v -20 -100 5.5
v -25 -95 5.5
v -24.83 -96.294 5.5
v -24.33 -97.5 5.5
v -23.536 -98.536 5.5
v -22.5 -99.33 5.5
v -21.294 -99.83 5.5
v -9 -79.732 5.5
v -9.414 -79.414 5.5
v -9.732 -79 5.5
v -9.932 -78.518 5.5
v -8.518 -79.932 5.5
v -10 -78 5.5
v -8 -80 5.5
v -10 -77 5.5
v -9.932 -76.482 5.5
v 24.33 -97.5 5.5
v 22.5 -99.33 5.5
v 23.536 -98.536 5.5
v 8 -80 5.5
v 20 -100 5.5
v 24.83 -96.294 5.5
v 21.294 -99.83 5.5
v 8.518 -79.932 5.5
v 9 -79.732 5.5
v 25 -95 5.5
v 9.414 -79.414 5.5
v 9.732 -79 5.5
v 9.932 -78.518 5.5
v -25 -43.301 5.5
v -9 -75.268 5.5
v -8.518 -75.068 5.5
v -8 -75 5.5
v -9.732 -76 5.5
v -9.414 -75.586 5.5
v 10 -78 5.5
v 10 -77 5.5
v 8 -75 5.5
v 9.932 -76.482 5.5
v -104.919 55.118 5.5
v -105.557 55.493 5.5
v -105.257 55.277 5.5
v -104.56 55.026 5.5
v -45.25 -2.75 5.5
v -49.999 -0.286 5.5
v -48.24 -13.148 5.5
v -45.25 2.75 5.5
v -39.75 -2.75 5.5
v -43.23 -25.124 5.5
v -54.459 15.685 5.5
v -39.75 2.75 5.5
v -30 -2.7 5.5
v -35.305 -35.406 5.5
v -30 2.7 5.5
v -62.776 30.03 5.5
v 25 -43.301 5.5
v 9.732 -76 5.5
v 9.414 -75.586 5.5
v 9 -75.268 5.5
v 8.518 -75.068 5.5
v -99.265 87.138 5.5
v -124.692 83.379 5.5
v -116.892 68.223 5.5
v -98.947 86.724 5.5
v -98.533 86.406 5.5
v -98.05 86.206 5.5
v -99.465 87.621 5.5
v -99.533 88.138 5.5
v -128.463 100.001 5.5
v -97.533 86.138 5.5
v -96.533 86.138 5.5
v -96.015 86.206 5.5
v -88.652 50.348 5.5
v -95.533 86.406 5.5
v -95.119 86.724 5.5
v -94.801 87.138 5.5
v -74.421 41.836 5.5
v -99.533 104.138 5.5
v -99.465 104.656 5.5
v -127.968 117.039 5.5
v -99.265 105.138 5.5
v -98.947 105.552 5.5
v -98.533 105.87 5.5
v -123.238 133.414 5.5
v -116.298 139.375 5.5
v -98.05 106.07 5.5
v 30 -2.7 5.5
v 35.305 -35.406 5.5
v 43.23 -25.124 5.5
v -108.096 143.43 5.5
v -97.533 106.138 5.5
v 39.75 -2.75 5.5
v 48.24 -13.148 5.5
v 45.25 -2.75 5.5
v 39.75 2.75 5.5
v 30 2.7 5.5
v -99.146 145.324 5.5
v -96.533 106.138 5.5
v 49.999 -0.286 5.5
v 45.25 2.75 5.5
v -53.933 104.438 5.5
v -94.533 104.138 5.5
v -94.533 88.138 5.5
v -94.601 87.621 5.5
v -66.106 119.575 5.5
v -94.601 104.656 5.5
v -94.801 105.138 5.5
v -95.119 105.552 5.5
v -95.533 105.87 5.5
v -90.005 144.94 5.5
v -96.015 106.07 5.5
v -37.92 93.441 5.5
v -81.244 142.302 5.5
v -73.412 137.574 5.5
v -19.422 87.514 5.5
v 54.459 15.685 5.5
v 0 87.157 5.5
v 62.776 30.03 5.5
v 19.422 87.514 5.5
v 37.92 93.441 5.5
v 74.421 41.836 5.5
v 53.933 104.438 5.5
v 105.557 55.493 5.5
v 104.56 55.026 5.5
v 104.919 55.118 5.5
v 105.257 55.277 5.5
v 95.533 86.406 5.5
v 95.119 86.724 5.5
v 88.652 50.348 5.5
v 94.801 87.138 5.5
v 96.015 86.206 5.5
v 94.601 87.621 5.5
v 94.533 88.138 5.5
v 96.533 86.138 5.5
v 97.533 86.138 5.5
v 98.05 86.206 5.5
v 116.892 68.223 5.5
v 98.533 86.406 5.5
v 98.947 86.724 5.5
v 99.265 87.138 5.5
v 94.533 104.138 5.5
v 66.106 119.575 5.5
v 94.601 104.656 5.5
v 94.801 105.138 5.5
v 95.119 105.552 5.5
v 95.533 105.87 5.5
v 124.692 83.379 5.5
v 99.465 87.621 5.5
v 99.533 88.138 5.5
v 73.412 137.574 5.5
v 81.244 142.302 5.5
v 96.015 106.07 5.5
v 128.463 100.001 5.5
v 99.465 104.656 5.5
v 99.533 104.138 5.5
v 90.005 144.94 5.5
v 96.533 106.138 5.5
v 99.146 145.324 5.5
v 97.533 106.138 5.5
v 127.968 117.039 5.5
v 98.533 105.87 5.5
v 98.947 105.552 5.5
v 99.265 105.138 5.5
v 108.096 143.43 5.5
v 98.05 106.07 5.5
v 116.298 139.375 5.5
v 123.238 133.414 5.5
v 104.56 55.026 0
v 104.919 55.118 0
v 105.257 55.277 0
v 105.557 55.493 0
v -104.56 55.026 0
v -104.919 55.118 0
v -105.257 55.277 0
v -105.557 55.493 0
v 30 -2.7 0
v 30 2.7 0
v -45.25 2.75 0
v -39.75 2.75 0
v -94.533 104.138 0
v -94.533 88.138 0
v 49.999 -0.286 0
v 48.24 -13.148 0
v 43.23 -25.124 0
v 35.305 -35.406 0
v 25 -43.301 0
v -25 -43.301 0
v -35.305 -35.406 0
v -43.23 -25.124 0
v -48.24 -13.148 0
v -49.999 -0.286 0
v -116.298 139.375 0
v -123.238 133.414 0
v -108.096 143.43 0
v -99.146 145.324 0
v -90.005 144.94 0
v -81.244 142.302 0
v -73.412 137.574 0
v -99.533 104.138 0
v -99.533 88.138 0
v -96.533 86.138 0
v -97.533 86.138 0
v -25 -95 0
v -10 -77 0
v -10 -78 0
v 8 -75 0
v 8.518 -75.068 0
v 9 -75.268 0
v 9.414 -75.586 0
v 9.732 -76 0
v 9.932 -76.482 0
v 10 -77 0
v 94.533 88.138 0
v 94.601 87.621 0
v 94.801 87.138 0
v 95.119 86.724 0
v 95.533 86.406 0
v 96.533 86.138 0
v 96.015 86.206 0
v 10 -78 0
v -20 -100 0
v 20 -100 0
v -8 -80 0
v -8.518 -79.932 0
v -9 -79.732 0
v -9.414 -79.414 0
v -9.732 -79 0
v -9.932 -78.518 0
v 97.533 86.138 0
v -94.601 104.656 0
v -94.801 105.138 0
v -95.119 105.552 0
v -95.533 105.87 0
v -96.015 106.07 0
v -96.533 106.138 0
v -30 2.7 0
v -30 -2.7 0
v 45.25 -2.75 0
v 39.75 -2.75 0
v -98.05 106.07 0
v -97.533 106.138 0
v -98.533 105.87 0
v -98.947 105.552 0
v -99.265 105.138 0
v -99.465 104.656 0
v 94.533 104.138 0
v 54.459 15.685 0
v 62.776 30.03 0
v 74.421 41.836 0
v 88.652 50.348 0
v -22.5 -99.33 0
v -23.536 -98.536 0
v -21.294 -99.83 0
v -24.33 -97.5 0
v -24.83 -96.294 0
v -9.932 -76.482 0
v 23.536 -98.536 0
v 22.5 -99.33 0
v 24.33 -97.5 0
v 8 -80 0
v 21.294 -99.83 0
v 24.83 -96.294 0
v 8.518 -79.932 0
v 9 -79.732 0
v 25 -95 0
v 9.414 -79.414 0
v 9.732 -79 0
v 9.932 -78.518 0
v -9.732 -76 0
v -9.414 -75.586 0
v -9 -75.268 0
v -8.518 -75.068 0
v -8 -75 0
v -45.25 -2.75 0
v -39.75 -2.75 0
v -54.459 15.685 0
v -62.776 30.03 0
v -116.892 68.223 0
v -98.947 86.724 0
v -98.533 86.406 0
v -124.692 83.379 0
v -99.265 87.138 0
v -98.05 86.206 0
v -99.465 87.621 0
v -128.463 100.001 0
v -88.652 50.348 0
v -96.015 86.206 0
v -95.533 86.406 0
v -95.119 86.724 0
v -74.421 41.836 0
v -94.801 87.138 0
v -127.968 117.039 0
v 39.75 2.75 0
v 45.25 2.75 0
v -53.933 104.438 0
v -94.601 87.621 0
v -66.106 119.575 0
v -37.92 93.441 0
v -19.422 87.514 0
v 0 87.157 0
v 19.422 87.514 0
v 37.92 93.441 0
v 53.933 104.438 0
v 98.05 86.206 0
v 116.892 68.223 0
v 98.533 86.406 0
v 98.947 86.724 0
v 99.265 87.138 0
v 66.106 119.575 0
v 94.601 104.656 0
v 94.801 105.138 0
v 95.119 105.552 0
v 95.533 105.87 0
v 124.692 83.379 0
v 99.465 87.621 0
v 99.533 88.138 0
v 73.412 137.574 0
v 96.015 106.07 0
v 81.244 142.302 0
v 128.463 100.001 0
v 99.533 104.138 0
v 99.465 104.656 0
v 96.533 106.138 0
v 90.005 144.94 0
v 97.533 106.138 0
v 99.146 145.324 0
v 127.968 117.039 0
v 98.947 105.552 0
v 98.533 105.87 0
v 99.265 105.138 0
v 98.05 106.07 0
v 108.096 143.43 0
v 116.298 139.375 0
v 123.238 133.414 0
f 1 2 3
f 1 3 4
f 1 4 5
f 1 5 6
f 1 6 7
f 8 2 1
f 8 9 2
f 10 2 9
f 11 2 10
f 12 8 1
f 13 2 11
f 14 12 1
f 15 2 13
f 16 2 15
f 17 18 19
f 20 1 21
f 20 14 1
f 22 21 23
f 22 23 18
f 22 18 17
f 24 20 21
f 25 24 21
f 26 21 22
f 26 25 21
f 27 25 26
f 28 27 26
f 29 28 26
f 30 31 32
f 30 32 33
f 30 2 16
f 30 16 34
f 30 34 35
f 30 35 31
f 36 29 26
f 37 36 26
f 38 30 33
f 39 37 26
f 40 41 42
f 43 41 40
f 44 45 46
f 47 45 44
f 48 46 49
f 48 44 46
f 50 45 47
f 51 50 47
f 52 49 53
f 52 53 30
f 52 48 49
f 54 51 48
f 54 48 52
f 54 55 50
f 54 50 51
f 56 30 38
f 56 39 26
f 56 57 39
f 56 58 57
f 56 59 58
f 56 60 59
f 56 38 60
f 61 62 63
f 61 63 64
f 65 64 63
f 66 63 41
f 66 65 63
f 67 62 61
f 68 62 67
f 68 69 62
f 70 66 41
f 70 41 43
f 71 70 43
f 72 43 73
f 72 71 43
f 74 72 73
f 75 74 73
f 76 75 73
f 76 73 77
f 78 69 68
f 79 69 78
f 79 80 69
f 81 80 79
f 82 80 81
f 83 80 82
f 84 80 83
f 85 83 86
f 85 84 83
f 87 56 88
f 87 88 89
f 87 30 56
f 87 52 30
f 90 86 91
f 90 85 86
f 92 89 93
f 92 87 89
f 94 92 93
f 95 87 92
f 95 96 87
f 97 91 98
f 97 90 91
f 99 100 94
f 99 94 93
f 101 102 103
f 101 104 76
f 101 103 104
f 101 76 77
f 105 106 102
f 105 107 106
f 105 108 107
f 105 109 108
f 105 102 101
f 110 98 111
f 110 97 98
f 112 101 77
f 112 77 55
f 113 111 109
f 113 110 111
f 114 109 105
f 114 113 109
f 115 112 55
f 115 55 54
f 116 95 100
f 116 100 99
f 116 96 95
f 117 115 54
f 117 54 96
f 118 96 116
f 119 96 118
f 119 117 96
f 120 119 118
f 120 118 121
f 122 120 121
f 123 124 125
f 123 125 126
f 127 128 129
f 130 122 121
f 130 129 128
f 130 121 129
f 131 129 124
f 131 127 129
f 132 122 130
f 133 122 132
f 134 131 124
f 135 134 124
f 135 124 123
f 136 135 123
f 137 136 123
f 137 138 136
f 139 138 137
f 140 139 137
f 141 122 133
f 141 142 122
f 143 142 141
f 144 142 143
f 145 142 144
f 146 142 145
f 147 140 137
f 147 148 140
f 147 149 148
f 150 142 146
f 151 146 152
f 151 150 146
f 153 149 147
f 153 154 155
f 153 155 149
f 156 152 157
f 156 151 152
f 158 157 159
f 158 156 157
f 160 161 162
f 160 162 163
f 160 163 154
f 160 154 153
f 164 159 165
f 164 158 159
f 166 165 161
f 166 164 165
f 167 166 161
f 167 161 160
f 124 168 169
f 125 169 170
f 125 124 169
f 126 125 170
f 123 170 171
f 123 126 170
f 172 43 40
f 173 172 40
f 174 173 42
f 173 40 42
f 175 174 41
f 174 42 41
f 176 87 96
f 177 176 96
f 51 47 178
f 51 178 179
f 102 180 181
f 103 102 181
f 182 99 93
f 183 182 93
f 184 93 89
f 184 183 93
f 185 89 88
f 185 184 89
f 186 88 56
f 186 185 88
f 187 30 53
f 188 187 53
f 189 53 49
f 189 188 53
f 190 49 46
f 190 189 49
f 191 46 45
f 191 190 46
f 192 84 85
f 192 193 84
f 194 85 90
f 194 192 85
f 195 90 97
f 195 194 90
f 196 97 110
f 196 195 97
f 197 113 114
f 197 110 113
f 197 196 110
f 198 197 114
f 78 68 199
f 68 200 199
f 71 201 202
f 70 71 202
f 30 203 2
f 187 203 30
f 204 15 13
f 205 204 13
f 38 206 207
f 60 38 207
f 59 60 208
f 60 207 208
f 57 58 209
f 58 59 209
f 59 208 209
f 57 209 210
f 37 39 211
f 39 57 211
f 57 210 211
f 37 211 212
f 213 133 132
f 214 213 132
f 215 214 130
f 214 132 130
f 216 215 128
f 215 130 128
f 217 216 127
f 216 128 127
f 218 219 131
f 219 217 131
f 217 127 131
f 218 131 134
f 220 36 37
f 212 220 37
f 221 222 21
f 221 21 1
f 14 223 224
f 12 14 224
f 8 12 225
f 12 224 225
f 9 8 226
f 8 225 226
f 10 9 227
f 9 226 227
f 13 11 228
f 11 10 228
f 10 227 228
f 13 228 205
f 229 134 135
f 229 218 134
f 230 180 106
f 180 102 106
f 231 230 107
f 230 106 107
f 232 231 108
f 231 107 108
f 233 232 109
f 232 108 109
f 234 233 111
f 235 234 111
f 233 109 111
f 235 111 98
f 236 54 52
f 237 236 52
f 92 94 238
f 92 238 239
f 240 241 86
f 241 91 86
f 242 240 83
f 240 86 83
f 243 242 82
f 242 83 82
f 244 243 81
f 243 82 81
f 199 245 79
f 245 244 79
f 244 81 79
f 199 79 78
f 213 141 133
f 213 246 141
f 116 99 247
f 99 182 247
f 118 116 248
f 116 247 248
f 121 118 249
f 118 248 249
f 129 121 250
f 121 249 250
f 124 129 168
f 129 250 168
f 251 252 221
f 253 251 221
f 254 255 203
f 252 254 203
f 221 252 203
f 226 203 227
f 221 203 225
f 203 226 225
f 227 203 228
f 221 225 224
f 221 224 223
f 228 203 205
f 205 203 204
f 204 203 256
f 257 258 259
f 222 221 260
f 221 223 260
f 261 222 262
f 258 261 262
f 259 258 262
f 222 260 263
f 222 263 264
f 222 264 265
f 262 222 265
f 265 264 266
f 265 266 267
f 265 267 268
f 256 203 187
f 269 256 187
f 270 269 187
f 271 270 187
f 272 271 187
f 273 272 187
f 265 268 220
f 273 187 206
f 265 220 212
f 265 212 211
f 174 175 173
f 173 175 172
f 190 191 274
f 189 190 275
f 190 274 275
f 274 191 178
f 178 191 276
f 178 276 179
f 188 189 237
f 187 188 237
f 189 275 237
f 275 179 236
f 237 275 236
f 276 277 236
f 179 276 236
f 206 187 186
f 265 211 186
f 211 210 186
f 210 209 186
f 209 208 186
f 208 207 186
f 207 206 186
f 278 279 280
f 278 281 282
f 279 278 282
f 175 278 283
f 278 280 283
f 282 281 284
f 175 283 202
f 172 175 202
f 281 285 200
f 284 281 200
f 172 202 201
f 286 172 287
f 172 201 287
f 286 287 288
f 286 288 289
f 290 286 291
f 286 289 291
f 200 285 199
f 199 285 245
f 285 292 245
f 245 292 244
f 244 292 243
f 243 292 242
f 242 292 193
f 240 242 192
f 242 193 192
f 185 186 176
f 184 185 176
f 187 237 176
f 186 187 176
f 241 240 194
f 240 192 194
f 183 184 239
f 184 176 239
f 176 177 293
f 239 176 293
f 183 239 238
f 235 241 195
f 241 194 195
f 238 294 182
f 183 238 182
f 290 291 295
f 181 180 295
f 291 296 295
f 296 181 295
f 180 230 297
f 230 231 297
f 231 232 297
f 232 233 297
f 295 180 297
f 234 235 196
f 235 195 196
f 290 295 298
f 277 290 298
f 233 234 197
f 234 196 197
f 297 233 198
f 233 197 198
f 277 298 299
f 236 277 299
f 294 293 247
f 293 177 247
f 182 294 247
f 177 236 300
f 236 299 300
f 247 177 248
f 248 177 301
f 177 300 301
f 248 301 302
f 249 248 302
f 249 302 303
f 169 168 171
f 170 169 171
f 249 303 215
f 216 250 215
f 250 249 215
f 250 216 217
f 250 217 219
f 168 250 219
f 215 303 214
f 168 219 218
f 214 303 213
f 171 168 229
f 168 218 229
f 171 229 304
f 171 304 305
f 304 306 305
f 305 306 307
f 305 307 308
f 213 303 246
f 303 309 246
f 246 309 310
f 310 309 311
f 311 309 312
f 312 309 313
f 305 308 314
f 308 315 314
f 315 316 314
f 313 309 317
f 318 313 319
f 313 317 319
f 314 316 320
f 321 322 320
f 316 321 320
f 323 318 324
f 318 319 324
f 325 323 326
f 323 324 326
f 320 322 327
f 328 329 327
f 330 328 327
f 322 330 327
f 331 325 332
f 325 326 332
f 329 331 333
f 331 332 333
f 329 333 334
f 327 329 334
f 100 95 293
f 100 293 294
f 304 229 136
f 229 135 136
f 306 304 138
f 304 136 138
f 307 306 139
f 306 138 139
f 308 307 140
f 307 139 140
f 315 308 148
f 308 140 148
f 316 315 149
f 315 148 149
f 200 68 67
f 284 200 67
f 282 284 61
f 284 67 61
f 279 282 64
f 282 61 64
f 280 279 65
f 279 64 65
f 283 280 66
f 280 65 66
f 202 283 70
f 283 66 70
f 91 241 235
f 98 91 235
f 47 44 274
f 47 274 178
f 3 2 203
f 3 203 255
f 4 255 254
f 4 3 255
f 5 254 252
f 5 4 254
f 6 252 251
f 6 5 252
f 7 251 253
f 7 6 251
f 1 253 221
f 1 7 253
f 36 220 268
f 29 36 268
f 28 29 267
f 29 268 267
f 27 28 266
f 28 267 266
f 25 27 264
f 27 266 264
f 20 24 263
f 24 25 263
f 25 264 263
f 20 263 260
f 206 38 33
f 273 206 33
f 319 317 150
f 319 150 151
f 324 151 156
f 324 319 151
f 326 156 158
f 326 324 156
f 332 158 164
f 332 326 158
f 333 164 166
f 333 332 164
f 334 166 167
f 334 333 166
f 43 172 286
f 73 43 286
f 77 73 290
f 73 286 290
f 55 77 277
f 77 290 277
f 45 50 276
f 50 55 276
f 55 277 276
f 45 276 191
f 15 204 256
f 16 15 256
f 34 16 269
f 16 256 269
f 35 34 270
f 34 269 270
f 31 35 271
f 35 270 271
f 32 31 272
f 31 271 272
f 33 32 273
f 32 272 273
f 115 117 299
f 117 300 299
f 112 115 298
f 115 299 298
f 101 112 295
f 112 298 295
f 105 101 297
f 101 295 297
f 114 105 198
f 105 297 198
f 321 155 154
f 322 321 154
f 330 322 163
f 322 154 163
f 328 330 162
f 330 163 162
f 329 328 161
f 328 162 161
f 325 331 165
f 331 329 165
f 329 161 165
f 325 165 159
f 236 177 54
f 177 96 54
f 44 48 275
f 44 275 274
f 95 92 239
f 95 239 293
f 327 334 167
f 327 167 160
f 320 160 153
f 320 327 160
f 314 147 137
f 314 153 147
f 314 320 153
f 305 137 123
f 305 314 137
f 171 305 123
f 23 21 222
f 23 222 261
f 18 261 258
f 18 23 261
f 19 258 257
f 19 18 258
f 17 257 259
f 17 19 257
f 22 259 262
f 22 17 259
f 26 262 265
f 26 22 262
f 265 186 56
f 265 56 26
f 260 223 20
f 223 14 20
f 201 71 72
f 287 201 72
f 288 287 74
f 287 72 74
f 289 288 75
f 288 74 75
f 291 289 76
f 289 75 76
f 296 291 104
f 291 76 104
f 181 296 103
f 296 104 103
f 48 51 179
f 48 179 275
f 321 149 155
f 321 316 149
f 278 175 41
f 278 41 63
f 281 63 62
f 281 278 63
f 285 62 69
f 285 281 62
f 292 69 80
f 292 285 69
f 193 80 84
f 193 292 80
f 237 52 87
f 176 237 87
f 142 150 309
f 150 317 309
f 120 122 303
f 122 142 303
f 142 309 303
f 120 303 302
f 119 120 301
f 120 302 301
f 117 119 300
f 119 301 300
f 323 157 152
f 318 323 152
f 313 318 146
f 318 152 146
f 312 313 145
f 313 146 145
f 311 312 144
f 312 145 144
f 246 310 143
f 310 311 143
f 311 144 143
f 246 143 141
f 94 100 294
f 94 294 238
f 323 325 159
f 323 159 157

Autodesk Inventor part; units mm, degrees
ref_plane "YZ Plane" through (0, 0, 0) normal (1, 0, 0) x (0, 1, 0)
ref_plane "XZ Plane" through (0, 0, 0) normal (0, 1, 0) x (-1, 0, 0)
ref_plane "XY Plane" through (0, 0, 0) normal (0, 0, 1) x (1, 0, 0)
sketch "Sketch1" plane through (0, 0, 0) normal (0, 0, 1) x (1, 0, 0)
  circle A0 centre (0, 0) radius 50
  arc A1 (-73.4116, 137.5742) -> (0, 87.1574) centre (-8.4976, 153.4397) ccw
  arc A2 (-73.4116, 137.5742) -> (-123.2383, 133.4142) centre (-96.0994, 108.8375) ccw
  arc A3 (-123.2383, 133.4142) -> (-105.1177, 55.113) centre (-61.0095, 106.5679) ccw
  arc A4 (-49.9992, -0.286) -> (-105.1177, 55.113) centre (-114.9857, -9.8243) ccw
  line L0 (-25, 0) -> (25, 0)
  line L1 (25, 0) -> (25, -100)
  line L2 (25, -100) -> (-25, -100)
  line L3 (-25, -100) -> (-25, 0)
  line L4 (0, 63.4714) -> (21.5005, 63.4714) construction
  line L5 (-99.5328, 106.1382) -> (-94.5328, 106.1382)
  line L6 (-94.5328, 106.1382) -> (-94.5328, 86.1382)
  line L7 (-94.5328, 86.1382) -> (-99.5328, 86.1382)
  line L8 (-99.5328, 86.1382) -> (-99.5328, 106.1382)
  arc A5 (0, 87.1574) -> (73.4116, 137.5742) centre (8.4976, 153.4397) ccw
  arc A6 (123.2383, 133.4142) -> (73.4116, 137.5742) centre (96.0994, 108.8375) ccw
  arc A7 (105.1177, 55.113) -> (123.2383, 133.4142) centre (61.0095, 106.5679) ccw
  arc A8 (105.1177, 55.113) -> (49.9992, -0.286) centre (114.9857, -9.8243) ccw
  line L9 (99.5328, 106.1382) -> (94.5328, 106.1382)
  line L10 (94.5328, 106.1382) -> (94.5328, 86.1382)
  line L11 (94.5328, 86.1382) -> (99.5328, 86.1382)
  line L12 (99.5328, 86.1382) -> (99.5328, 106.1382)
  line L13 (49.9992, -0.286) -> (-49.9992, -0.286)
  line L14 (-7.7212, -92.2433) -> (-3.7298, -89.2319)
  line L15 (-3.7298, -89.2319) -> (-15.7757, -73.2664)
  line L16 (-15.7757, -73.2664) -> (-19.7671, -76.2779)
  line L17 (-19.7671, -76.2779) -> (-7.7212, -92.2433)
  line L18 (7.7212, -92.2433) -> (3.7298, -89.2319)
  line L19 (3.7298, -89.2319) -> (15.7757, -73.2664)
  line L20 (15.7757, -73.2664) -> (19.7671, -76.2779)
  line L21 (19.7671, -76.2779) -> (7.7212, -92.2433)
  dimension "d0" = 100
  dimension "d4" = 50
  dimension "d5" = 50
  dimension "d6" = 100
  dimension "d8" = 5
  dimension "d9" = 20
  dimension "d10" = 5
  dimension "d11" = 20
  dimension "d12" = 5
extrude "Extrusion2" add sketch "Sketch1" along normal blind 5.5 contours A0 L13 L1 L0 L3 | A0 A4 A3 A2 A1 A5 A6 A7 A8 | L13 L3 A0 | A0 L1 L13 | L3 L13 L1 A0 | A0 L1 L2 L3 | L3 L0 L1 L13 | L17 L16 L15 L14 | L18 L19 L20 L21
fillet "Fillet4" radius 2 4 edges at (-99.5328, 106.1382, 2.75) (-94.5328, 106.1382, 2.75) (-94.5328, 86.1382, 2.75) (-99.5328, 86.1382, 2.75)
fillet "Fillet5" radius 2 4 edges at (99.5328, 86.1382, 2.75) (99.5328, 106.1382, 2.75) (94.5328, 106.1382, 2.75) (94.5328, 86.1382, 2.75)
sketch "Sketch2" plane through (0, 0, 5.5) normal (0, 0, 1) x (1, 0, 0)
  line L0 (-10, -80) -> (10, -80)
  line L1 (10, -80) -> (10, -75)
  line L2 (10, -75) -> (-10, -75)
  line L3 (-10, -75) -> (-10, -80)
  point P0 (0, 0)
  dimension "d20" = 20
  dimension "d21" = 5
extrude "Extrusion3" cut sketch "Sketch2" against normal blind 5.5
fillet "Fillet6" radius 5 2 edges at (25, -100, 2.75) (-25, -100, 2.75)
fillet "Fillet7" radius 2 4 edges at (-10, -75, 2.75) (-10, -80, 2.75) (10, -80, 2.75) (10, -75, 2.75)
fillet "Fillet8" radius 2 2 edges at (-105.1177, 55.113, 2.75) (105.1177, 55.113, 2.75)
sketch "Sketch4" plane through (0, 0, 5.5) normal (0, 0, 1) x (1, 0, 0)
  line L0 (30, 2.7) -> (-30, 2.7)
  line L1 (-30, 2.7) -> (-30, -2.7)
  line L2 (-30, -2.7) -> (30, -2.7)
  line L3 (30, -2.7) -> (30, 2.7)
  point P0 (0, 0)
  dimension "d34" = 60
  dimension "d35" = 5.4
extrude "Extrusion5" cut sketch "Sketch4" against normal blind 10
sketch "Sketch5" plane through (0, 0, 5.5) normal (0, 0, 1) x (1, 0, 0)
  line L0 (39.75, 2.75) -> (45.25, 2.75)
  line L1 (45.25, 2.75) -> (45.25, -2.75)
  line L2 (45.25, -2.75) -> (39.75, -2.75)
  line L3 (39.75, -2.75) -> (39.75, 2.75)
  line L4 (-39.75, -2.75) -> (-45.25, -2.75)
  line L5 (-45.25, -2.75) -> (-45.25, 2.75)
  line L6 (-45.25, 2.75) -> (-39.75, 2.75)
  line L7 (-39.75, 2.75) -> (-39.75, -2.75)
  point P0 (0, 0)
  point P1 (0, 0)
  dimension "d40" = 5.5
  dimension "d41" = 5.5
  dimension "d42" = 360
extrude "Extrusion6" cut sketch "Sketch5" against normal blind 10
properties part number "central"
